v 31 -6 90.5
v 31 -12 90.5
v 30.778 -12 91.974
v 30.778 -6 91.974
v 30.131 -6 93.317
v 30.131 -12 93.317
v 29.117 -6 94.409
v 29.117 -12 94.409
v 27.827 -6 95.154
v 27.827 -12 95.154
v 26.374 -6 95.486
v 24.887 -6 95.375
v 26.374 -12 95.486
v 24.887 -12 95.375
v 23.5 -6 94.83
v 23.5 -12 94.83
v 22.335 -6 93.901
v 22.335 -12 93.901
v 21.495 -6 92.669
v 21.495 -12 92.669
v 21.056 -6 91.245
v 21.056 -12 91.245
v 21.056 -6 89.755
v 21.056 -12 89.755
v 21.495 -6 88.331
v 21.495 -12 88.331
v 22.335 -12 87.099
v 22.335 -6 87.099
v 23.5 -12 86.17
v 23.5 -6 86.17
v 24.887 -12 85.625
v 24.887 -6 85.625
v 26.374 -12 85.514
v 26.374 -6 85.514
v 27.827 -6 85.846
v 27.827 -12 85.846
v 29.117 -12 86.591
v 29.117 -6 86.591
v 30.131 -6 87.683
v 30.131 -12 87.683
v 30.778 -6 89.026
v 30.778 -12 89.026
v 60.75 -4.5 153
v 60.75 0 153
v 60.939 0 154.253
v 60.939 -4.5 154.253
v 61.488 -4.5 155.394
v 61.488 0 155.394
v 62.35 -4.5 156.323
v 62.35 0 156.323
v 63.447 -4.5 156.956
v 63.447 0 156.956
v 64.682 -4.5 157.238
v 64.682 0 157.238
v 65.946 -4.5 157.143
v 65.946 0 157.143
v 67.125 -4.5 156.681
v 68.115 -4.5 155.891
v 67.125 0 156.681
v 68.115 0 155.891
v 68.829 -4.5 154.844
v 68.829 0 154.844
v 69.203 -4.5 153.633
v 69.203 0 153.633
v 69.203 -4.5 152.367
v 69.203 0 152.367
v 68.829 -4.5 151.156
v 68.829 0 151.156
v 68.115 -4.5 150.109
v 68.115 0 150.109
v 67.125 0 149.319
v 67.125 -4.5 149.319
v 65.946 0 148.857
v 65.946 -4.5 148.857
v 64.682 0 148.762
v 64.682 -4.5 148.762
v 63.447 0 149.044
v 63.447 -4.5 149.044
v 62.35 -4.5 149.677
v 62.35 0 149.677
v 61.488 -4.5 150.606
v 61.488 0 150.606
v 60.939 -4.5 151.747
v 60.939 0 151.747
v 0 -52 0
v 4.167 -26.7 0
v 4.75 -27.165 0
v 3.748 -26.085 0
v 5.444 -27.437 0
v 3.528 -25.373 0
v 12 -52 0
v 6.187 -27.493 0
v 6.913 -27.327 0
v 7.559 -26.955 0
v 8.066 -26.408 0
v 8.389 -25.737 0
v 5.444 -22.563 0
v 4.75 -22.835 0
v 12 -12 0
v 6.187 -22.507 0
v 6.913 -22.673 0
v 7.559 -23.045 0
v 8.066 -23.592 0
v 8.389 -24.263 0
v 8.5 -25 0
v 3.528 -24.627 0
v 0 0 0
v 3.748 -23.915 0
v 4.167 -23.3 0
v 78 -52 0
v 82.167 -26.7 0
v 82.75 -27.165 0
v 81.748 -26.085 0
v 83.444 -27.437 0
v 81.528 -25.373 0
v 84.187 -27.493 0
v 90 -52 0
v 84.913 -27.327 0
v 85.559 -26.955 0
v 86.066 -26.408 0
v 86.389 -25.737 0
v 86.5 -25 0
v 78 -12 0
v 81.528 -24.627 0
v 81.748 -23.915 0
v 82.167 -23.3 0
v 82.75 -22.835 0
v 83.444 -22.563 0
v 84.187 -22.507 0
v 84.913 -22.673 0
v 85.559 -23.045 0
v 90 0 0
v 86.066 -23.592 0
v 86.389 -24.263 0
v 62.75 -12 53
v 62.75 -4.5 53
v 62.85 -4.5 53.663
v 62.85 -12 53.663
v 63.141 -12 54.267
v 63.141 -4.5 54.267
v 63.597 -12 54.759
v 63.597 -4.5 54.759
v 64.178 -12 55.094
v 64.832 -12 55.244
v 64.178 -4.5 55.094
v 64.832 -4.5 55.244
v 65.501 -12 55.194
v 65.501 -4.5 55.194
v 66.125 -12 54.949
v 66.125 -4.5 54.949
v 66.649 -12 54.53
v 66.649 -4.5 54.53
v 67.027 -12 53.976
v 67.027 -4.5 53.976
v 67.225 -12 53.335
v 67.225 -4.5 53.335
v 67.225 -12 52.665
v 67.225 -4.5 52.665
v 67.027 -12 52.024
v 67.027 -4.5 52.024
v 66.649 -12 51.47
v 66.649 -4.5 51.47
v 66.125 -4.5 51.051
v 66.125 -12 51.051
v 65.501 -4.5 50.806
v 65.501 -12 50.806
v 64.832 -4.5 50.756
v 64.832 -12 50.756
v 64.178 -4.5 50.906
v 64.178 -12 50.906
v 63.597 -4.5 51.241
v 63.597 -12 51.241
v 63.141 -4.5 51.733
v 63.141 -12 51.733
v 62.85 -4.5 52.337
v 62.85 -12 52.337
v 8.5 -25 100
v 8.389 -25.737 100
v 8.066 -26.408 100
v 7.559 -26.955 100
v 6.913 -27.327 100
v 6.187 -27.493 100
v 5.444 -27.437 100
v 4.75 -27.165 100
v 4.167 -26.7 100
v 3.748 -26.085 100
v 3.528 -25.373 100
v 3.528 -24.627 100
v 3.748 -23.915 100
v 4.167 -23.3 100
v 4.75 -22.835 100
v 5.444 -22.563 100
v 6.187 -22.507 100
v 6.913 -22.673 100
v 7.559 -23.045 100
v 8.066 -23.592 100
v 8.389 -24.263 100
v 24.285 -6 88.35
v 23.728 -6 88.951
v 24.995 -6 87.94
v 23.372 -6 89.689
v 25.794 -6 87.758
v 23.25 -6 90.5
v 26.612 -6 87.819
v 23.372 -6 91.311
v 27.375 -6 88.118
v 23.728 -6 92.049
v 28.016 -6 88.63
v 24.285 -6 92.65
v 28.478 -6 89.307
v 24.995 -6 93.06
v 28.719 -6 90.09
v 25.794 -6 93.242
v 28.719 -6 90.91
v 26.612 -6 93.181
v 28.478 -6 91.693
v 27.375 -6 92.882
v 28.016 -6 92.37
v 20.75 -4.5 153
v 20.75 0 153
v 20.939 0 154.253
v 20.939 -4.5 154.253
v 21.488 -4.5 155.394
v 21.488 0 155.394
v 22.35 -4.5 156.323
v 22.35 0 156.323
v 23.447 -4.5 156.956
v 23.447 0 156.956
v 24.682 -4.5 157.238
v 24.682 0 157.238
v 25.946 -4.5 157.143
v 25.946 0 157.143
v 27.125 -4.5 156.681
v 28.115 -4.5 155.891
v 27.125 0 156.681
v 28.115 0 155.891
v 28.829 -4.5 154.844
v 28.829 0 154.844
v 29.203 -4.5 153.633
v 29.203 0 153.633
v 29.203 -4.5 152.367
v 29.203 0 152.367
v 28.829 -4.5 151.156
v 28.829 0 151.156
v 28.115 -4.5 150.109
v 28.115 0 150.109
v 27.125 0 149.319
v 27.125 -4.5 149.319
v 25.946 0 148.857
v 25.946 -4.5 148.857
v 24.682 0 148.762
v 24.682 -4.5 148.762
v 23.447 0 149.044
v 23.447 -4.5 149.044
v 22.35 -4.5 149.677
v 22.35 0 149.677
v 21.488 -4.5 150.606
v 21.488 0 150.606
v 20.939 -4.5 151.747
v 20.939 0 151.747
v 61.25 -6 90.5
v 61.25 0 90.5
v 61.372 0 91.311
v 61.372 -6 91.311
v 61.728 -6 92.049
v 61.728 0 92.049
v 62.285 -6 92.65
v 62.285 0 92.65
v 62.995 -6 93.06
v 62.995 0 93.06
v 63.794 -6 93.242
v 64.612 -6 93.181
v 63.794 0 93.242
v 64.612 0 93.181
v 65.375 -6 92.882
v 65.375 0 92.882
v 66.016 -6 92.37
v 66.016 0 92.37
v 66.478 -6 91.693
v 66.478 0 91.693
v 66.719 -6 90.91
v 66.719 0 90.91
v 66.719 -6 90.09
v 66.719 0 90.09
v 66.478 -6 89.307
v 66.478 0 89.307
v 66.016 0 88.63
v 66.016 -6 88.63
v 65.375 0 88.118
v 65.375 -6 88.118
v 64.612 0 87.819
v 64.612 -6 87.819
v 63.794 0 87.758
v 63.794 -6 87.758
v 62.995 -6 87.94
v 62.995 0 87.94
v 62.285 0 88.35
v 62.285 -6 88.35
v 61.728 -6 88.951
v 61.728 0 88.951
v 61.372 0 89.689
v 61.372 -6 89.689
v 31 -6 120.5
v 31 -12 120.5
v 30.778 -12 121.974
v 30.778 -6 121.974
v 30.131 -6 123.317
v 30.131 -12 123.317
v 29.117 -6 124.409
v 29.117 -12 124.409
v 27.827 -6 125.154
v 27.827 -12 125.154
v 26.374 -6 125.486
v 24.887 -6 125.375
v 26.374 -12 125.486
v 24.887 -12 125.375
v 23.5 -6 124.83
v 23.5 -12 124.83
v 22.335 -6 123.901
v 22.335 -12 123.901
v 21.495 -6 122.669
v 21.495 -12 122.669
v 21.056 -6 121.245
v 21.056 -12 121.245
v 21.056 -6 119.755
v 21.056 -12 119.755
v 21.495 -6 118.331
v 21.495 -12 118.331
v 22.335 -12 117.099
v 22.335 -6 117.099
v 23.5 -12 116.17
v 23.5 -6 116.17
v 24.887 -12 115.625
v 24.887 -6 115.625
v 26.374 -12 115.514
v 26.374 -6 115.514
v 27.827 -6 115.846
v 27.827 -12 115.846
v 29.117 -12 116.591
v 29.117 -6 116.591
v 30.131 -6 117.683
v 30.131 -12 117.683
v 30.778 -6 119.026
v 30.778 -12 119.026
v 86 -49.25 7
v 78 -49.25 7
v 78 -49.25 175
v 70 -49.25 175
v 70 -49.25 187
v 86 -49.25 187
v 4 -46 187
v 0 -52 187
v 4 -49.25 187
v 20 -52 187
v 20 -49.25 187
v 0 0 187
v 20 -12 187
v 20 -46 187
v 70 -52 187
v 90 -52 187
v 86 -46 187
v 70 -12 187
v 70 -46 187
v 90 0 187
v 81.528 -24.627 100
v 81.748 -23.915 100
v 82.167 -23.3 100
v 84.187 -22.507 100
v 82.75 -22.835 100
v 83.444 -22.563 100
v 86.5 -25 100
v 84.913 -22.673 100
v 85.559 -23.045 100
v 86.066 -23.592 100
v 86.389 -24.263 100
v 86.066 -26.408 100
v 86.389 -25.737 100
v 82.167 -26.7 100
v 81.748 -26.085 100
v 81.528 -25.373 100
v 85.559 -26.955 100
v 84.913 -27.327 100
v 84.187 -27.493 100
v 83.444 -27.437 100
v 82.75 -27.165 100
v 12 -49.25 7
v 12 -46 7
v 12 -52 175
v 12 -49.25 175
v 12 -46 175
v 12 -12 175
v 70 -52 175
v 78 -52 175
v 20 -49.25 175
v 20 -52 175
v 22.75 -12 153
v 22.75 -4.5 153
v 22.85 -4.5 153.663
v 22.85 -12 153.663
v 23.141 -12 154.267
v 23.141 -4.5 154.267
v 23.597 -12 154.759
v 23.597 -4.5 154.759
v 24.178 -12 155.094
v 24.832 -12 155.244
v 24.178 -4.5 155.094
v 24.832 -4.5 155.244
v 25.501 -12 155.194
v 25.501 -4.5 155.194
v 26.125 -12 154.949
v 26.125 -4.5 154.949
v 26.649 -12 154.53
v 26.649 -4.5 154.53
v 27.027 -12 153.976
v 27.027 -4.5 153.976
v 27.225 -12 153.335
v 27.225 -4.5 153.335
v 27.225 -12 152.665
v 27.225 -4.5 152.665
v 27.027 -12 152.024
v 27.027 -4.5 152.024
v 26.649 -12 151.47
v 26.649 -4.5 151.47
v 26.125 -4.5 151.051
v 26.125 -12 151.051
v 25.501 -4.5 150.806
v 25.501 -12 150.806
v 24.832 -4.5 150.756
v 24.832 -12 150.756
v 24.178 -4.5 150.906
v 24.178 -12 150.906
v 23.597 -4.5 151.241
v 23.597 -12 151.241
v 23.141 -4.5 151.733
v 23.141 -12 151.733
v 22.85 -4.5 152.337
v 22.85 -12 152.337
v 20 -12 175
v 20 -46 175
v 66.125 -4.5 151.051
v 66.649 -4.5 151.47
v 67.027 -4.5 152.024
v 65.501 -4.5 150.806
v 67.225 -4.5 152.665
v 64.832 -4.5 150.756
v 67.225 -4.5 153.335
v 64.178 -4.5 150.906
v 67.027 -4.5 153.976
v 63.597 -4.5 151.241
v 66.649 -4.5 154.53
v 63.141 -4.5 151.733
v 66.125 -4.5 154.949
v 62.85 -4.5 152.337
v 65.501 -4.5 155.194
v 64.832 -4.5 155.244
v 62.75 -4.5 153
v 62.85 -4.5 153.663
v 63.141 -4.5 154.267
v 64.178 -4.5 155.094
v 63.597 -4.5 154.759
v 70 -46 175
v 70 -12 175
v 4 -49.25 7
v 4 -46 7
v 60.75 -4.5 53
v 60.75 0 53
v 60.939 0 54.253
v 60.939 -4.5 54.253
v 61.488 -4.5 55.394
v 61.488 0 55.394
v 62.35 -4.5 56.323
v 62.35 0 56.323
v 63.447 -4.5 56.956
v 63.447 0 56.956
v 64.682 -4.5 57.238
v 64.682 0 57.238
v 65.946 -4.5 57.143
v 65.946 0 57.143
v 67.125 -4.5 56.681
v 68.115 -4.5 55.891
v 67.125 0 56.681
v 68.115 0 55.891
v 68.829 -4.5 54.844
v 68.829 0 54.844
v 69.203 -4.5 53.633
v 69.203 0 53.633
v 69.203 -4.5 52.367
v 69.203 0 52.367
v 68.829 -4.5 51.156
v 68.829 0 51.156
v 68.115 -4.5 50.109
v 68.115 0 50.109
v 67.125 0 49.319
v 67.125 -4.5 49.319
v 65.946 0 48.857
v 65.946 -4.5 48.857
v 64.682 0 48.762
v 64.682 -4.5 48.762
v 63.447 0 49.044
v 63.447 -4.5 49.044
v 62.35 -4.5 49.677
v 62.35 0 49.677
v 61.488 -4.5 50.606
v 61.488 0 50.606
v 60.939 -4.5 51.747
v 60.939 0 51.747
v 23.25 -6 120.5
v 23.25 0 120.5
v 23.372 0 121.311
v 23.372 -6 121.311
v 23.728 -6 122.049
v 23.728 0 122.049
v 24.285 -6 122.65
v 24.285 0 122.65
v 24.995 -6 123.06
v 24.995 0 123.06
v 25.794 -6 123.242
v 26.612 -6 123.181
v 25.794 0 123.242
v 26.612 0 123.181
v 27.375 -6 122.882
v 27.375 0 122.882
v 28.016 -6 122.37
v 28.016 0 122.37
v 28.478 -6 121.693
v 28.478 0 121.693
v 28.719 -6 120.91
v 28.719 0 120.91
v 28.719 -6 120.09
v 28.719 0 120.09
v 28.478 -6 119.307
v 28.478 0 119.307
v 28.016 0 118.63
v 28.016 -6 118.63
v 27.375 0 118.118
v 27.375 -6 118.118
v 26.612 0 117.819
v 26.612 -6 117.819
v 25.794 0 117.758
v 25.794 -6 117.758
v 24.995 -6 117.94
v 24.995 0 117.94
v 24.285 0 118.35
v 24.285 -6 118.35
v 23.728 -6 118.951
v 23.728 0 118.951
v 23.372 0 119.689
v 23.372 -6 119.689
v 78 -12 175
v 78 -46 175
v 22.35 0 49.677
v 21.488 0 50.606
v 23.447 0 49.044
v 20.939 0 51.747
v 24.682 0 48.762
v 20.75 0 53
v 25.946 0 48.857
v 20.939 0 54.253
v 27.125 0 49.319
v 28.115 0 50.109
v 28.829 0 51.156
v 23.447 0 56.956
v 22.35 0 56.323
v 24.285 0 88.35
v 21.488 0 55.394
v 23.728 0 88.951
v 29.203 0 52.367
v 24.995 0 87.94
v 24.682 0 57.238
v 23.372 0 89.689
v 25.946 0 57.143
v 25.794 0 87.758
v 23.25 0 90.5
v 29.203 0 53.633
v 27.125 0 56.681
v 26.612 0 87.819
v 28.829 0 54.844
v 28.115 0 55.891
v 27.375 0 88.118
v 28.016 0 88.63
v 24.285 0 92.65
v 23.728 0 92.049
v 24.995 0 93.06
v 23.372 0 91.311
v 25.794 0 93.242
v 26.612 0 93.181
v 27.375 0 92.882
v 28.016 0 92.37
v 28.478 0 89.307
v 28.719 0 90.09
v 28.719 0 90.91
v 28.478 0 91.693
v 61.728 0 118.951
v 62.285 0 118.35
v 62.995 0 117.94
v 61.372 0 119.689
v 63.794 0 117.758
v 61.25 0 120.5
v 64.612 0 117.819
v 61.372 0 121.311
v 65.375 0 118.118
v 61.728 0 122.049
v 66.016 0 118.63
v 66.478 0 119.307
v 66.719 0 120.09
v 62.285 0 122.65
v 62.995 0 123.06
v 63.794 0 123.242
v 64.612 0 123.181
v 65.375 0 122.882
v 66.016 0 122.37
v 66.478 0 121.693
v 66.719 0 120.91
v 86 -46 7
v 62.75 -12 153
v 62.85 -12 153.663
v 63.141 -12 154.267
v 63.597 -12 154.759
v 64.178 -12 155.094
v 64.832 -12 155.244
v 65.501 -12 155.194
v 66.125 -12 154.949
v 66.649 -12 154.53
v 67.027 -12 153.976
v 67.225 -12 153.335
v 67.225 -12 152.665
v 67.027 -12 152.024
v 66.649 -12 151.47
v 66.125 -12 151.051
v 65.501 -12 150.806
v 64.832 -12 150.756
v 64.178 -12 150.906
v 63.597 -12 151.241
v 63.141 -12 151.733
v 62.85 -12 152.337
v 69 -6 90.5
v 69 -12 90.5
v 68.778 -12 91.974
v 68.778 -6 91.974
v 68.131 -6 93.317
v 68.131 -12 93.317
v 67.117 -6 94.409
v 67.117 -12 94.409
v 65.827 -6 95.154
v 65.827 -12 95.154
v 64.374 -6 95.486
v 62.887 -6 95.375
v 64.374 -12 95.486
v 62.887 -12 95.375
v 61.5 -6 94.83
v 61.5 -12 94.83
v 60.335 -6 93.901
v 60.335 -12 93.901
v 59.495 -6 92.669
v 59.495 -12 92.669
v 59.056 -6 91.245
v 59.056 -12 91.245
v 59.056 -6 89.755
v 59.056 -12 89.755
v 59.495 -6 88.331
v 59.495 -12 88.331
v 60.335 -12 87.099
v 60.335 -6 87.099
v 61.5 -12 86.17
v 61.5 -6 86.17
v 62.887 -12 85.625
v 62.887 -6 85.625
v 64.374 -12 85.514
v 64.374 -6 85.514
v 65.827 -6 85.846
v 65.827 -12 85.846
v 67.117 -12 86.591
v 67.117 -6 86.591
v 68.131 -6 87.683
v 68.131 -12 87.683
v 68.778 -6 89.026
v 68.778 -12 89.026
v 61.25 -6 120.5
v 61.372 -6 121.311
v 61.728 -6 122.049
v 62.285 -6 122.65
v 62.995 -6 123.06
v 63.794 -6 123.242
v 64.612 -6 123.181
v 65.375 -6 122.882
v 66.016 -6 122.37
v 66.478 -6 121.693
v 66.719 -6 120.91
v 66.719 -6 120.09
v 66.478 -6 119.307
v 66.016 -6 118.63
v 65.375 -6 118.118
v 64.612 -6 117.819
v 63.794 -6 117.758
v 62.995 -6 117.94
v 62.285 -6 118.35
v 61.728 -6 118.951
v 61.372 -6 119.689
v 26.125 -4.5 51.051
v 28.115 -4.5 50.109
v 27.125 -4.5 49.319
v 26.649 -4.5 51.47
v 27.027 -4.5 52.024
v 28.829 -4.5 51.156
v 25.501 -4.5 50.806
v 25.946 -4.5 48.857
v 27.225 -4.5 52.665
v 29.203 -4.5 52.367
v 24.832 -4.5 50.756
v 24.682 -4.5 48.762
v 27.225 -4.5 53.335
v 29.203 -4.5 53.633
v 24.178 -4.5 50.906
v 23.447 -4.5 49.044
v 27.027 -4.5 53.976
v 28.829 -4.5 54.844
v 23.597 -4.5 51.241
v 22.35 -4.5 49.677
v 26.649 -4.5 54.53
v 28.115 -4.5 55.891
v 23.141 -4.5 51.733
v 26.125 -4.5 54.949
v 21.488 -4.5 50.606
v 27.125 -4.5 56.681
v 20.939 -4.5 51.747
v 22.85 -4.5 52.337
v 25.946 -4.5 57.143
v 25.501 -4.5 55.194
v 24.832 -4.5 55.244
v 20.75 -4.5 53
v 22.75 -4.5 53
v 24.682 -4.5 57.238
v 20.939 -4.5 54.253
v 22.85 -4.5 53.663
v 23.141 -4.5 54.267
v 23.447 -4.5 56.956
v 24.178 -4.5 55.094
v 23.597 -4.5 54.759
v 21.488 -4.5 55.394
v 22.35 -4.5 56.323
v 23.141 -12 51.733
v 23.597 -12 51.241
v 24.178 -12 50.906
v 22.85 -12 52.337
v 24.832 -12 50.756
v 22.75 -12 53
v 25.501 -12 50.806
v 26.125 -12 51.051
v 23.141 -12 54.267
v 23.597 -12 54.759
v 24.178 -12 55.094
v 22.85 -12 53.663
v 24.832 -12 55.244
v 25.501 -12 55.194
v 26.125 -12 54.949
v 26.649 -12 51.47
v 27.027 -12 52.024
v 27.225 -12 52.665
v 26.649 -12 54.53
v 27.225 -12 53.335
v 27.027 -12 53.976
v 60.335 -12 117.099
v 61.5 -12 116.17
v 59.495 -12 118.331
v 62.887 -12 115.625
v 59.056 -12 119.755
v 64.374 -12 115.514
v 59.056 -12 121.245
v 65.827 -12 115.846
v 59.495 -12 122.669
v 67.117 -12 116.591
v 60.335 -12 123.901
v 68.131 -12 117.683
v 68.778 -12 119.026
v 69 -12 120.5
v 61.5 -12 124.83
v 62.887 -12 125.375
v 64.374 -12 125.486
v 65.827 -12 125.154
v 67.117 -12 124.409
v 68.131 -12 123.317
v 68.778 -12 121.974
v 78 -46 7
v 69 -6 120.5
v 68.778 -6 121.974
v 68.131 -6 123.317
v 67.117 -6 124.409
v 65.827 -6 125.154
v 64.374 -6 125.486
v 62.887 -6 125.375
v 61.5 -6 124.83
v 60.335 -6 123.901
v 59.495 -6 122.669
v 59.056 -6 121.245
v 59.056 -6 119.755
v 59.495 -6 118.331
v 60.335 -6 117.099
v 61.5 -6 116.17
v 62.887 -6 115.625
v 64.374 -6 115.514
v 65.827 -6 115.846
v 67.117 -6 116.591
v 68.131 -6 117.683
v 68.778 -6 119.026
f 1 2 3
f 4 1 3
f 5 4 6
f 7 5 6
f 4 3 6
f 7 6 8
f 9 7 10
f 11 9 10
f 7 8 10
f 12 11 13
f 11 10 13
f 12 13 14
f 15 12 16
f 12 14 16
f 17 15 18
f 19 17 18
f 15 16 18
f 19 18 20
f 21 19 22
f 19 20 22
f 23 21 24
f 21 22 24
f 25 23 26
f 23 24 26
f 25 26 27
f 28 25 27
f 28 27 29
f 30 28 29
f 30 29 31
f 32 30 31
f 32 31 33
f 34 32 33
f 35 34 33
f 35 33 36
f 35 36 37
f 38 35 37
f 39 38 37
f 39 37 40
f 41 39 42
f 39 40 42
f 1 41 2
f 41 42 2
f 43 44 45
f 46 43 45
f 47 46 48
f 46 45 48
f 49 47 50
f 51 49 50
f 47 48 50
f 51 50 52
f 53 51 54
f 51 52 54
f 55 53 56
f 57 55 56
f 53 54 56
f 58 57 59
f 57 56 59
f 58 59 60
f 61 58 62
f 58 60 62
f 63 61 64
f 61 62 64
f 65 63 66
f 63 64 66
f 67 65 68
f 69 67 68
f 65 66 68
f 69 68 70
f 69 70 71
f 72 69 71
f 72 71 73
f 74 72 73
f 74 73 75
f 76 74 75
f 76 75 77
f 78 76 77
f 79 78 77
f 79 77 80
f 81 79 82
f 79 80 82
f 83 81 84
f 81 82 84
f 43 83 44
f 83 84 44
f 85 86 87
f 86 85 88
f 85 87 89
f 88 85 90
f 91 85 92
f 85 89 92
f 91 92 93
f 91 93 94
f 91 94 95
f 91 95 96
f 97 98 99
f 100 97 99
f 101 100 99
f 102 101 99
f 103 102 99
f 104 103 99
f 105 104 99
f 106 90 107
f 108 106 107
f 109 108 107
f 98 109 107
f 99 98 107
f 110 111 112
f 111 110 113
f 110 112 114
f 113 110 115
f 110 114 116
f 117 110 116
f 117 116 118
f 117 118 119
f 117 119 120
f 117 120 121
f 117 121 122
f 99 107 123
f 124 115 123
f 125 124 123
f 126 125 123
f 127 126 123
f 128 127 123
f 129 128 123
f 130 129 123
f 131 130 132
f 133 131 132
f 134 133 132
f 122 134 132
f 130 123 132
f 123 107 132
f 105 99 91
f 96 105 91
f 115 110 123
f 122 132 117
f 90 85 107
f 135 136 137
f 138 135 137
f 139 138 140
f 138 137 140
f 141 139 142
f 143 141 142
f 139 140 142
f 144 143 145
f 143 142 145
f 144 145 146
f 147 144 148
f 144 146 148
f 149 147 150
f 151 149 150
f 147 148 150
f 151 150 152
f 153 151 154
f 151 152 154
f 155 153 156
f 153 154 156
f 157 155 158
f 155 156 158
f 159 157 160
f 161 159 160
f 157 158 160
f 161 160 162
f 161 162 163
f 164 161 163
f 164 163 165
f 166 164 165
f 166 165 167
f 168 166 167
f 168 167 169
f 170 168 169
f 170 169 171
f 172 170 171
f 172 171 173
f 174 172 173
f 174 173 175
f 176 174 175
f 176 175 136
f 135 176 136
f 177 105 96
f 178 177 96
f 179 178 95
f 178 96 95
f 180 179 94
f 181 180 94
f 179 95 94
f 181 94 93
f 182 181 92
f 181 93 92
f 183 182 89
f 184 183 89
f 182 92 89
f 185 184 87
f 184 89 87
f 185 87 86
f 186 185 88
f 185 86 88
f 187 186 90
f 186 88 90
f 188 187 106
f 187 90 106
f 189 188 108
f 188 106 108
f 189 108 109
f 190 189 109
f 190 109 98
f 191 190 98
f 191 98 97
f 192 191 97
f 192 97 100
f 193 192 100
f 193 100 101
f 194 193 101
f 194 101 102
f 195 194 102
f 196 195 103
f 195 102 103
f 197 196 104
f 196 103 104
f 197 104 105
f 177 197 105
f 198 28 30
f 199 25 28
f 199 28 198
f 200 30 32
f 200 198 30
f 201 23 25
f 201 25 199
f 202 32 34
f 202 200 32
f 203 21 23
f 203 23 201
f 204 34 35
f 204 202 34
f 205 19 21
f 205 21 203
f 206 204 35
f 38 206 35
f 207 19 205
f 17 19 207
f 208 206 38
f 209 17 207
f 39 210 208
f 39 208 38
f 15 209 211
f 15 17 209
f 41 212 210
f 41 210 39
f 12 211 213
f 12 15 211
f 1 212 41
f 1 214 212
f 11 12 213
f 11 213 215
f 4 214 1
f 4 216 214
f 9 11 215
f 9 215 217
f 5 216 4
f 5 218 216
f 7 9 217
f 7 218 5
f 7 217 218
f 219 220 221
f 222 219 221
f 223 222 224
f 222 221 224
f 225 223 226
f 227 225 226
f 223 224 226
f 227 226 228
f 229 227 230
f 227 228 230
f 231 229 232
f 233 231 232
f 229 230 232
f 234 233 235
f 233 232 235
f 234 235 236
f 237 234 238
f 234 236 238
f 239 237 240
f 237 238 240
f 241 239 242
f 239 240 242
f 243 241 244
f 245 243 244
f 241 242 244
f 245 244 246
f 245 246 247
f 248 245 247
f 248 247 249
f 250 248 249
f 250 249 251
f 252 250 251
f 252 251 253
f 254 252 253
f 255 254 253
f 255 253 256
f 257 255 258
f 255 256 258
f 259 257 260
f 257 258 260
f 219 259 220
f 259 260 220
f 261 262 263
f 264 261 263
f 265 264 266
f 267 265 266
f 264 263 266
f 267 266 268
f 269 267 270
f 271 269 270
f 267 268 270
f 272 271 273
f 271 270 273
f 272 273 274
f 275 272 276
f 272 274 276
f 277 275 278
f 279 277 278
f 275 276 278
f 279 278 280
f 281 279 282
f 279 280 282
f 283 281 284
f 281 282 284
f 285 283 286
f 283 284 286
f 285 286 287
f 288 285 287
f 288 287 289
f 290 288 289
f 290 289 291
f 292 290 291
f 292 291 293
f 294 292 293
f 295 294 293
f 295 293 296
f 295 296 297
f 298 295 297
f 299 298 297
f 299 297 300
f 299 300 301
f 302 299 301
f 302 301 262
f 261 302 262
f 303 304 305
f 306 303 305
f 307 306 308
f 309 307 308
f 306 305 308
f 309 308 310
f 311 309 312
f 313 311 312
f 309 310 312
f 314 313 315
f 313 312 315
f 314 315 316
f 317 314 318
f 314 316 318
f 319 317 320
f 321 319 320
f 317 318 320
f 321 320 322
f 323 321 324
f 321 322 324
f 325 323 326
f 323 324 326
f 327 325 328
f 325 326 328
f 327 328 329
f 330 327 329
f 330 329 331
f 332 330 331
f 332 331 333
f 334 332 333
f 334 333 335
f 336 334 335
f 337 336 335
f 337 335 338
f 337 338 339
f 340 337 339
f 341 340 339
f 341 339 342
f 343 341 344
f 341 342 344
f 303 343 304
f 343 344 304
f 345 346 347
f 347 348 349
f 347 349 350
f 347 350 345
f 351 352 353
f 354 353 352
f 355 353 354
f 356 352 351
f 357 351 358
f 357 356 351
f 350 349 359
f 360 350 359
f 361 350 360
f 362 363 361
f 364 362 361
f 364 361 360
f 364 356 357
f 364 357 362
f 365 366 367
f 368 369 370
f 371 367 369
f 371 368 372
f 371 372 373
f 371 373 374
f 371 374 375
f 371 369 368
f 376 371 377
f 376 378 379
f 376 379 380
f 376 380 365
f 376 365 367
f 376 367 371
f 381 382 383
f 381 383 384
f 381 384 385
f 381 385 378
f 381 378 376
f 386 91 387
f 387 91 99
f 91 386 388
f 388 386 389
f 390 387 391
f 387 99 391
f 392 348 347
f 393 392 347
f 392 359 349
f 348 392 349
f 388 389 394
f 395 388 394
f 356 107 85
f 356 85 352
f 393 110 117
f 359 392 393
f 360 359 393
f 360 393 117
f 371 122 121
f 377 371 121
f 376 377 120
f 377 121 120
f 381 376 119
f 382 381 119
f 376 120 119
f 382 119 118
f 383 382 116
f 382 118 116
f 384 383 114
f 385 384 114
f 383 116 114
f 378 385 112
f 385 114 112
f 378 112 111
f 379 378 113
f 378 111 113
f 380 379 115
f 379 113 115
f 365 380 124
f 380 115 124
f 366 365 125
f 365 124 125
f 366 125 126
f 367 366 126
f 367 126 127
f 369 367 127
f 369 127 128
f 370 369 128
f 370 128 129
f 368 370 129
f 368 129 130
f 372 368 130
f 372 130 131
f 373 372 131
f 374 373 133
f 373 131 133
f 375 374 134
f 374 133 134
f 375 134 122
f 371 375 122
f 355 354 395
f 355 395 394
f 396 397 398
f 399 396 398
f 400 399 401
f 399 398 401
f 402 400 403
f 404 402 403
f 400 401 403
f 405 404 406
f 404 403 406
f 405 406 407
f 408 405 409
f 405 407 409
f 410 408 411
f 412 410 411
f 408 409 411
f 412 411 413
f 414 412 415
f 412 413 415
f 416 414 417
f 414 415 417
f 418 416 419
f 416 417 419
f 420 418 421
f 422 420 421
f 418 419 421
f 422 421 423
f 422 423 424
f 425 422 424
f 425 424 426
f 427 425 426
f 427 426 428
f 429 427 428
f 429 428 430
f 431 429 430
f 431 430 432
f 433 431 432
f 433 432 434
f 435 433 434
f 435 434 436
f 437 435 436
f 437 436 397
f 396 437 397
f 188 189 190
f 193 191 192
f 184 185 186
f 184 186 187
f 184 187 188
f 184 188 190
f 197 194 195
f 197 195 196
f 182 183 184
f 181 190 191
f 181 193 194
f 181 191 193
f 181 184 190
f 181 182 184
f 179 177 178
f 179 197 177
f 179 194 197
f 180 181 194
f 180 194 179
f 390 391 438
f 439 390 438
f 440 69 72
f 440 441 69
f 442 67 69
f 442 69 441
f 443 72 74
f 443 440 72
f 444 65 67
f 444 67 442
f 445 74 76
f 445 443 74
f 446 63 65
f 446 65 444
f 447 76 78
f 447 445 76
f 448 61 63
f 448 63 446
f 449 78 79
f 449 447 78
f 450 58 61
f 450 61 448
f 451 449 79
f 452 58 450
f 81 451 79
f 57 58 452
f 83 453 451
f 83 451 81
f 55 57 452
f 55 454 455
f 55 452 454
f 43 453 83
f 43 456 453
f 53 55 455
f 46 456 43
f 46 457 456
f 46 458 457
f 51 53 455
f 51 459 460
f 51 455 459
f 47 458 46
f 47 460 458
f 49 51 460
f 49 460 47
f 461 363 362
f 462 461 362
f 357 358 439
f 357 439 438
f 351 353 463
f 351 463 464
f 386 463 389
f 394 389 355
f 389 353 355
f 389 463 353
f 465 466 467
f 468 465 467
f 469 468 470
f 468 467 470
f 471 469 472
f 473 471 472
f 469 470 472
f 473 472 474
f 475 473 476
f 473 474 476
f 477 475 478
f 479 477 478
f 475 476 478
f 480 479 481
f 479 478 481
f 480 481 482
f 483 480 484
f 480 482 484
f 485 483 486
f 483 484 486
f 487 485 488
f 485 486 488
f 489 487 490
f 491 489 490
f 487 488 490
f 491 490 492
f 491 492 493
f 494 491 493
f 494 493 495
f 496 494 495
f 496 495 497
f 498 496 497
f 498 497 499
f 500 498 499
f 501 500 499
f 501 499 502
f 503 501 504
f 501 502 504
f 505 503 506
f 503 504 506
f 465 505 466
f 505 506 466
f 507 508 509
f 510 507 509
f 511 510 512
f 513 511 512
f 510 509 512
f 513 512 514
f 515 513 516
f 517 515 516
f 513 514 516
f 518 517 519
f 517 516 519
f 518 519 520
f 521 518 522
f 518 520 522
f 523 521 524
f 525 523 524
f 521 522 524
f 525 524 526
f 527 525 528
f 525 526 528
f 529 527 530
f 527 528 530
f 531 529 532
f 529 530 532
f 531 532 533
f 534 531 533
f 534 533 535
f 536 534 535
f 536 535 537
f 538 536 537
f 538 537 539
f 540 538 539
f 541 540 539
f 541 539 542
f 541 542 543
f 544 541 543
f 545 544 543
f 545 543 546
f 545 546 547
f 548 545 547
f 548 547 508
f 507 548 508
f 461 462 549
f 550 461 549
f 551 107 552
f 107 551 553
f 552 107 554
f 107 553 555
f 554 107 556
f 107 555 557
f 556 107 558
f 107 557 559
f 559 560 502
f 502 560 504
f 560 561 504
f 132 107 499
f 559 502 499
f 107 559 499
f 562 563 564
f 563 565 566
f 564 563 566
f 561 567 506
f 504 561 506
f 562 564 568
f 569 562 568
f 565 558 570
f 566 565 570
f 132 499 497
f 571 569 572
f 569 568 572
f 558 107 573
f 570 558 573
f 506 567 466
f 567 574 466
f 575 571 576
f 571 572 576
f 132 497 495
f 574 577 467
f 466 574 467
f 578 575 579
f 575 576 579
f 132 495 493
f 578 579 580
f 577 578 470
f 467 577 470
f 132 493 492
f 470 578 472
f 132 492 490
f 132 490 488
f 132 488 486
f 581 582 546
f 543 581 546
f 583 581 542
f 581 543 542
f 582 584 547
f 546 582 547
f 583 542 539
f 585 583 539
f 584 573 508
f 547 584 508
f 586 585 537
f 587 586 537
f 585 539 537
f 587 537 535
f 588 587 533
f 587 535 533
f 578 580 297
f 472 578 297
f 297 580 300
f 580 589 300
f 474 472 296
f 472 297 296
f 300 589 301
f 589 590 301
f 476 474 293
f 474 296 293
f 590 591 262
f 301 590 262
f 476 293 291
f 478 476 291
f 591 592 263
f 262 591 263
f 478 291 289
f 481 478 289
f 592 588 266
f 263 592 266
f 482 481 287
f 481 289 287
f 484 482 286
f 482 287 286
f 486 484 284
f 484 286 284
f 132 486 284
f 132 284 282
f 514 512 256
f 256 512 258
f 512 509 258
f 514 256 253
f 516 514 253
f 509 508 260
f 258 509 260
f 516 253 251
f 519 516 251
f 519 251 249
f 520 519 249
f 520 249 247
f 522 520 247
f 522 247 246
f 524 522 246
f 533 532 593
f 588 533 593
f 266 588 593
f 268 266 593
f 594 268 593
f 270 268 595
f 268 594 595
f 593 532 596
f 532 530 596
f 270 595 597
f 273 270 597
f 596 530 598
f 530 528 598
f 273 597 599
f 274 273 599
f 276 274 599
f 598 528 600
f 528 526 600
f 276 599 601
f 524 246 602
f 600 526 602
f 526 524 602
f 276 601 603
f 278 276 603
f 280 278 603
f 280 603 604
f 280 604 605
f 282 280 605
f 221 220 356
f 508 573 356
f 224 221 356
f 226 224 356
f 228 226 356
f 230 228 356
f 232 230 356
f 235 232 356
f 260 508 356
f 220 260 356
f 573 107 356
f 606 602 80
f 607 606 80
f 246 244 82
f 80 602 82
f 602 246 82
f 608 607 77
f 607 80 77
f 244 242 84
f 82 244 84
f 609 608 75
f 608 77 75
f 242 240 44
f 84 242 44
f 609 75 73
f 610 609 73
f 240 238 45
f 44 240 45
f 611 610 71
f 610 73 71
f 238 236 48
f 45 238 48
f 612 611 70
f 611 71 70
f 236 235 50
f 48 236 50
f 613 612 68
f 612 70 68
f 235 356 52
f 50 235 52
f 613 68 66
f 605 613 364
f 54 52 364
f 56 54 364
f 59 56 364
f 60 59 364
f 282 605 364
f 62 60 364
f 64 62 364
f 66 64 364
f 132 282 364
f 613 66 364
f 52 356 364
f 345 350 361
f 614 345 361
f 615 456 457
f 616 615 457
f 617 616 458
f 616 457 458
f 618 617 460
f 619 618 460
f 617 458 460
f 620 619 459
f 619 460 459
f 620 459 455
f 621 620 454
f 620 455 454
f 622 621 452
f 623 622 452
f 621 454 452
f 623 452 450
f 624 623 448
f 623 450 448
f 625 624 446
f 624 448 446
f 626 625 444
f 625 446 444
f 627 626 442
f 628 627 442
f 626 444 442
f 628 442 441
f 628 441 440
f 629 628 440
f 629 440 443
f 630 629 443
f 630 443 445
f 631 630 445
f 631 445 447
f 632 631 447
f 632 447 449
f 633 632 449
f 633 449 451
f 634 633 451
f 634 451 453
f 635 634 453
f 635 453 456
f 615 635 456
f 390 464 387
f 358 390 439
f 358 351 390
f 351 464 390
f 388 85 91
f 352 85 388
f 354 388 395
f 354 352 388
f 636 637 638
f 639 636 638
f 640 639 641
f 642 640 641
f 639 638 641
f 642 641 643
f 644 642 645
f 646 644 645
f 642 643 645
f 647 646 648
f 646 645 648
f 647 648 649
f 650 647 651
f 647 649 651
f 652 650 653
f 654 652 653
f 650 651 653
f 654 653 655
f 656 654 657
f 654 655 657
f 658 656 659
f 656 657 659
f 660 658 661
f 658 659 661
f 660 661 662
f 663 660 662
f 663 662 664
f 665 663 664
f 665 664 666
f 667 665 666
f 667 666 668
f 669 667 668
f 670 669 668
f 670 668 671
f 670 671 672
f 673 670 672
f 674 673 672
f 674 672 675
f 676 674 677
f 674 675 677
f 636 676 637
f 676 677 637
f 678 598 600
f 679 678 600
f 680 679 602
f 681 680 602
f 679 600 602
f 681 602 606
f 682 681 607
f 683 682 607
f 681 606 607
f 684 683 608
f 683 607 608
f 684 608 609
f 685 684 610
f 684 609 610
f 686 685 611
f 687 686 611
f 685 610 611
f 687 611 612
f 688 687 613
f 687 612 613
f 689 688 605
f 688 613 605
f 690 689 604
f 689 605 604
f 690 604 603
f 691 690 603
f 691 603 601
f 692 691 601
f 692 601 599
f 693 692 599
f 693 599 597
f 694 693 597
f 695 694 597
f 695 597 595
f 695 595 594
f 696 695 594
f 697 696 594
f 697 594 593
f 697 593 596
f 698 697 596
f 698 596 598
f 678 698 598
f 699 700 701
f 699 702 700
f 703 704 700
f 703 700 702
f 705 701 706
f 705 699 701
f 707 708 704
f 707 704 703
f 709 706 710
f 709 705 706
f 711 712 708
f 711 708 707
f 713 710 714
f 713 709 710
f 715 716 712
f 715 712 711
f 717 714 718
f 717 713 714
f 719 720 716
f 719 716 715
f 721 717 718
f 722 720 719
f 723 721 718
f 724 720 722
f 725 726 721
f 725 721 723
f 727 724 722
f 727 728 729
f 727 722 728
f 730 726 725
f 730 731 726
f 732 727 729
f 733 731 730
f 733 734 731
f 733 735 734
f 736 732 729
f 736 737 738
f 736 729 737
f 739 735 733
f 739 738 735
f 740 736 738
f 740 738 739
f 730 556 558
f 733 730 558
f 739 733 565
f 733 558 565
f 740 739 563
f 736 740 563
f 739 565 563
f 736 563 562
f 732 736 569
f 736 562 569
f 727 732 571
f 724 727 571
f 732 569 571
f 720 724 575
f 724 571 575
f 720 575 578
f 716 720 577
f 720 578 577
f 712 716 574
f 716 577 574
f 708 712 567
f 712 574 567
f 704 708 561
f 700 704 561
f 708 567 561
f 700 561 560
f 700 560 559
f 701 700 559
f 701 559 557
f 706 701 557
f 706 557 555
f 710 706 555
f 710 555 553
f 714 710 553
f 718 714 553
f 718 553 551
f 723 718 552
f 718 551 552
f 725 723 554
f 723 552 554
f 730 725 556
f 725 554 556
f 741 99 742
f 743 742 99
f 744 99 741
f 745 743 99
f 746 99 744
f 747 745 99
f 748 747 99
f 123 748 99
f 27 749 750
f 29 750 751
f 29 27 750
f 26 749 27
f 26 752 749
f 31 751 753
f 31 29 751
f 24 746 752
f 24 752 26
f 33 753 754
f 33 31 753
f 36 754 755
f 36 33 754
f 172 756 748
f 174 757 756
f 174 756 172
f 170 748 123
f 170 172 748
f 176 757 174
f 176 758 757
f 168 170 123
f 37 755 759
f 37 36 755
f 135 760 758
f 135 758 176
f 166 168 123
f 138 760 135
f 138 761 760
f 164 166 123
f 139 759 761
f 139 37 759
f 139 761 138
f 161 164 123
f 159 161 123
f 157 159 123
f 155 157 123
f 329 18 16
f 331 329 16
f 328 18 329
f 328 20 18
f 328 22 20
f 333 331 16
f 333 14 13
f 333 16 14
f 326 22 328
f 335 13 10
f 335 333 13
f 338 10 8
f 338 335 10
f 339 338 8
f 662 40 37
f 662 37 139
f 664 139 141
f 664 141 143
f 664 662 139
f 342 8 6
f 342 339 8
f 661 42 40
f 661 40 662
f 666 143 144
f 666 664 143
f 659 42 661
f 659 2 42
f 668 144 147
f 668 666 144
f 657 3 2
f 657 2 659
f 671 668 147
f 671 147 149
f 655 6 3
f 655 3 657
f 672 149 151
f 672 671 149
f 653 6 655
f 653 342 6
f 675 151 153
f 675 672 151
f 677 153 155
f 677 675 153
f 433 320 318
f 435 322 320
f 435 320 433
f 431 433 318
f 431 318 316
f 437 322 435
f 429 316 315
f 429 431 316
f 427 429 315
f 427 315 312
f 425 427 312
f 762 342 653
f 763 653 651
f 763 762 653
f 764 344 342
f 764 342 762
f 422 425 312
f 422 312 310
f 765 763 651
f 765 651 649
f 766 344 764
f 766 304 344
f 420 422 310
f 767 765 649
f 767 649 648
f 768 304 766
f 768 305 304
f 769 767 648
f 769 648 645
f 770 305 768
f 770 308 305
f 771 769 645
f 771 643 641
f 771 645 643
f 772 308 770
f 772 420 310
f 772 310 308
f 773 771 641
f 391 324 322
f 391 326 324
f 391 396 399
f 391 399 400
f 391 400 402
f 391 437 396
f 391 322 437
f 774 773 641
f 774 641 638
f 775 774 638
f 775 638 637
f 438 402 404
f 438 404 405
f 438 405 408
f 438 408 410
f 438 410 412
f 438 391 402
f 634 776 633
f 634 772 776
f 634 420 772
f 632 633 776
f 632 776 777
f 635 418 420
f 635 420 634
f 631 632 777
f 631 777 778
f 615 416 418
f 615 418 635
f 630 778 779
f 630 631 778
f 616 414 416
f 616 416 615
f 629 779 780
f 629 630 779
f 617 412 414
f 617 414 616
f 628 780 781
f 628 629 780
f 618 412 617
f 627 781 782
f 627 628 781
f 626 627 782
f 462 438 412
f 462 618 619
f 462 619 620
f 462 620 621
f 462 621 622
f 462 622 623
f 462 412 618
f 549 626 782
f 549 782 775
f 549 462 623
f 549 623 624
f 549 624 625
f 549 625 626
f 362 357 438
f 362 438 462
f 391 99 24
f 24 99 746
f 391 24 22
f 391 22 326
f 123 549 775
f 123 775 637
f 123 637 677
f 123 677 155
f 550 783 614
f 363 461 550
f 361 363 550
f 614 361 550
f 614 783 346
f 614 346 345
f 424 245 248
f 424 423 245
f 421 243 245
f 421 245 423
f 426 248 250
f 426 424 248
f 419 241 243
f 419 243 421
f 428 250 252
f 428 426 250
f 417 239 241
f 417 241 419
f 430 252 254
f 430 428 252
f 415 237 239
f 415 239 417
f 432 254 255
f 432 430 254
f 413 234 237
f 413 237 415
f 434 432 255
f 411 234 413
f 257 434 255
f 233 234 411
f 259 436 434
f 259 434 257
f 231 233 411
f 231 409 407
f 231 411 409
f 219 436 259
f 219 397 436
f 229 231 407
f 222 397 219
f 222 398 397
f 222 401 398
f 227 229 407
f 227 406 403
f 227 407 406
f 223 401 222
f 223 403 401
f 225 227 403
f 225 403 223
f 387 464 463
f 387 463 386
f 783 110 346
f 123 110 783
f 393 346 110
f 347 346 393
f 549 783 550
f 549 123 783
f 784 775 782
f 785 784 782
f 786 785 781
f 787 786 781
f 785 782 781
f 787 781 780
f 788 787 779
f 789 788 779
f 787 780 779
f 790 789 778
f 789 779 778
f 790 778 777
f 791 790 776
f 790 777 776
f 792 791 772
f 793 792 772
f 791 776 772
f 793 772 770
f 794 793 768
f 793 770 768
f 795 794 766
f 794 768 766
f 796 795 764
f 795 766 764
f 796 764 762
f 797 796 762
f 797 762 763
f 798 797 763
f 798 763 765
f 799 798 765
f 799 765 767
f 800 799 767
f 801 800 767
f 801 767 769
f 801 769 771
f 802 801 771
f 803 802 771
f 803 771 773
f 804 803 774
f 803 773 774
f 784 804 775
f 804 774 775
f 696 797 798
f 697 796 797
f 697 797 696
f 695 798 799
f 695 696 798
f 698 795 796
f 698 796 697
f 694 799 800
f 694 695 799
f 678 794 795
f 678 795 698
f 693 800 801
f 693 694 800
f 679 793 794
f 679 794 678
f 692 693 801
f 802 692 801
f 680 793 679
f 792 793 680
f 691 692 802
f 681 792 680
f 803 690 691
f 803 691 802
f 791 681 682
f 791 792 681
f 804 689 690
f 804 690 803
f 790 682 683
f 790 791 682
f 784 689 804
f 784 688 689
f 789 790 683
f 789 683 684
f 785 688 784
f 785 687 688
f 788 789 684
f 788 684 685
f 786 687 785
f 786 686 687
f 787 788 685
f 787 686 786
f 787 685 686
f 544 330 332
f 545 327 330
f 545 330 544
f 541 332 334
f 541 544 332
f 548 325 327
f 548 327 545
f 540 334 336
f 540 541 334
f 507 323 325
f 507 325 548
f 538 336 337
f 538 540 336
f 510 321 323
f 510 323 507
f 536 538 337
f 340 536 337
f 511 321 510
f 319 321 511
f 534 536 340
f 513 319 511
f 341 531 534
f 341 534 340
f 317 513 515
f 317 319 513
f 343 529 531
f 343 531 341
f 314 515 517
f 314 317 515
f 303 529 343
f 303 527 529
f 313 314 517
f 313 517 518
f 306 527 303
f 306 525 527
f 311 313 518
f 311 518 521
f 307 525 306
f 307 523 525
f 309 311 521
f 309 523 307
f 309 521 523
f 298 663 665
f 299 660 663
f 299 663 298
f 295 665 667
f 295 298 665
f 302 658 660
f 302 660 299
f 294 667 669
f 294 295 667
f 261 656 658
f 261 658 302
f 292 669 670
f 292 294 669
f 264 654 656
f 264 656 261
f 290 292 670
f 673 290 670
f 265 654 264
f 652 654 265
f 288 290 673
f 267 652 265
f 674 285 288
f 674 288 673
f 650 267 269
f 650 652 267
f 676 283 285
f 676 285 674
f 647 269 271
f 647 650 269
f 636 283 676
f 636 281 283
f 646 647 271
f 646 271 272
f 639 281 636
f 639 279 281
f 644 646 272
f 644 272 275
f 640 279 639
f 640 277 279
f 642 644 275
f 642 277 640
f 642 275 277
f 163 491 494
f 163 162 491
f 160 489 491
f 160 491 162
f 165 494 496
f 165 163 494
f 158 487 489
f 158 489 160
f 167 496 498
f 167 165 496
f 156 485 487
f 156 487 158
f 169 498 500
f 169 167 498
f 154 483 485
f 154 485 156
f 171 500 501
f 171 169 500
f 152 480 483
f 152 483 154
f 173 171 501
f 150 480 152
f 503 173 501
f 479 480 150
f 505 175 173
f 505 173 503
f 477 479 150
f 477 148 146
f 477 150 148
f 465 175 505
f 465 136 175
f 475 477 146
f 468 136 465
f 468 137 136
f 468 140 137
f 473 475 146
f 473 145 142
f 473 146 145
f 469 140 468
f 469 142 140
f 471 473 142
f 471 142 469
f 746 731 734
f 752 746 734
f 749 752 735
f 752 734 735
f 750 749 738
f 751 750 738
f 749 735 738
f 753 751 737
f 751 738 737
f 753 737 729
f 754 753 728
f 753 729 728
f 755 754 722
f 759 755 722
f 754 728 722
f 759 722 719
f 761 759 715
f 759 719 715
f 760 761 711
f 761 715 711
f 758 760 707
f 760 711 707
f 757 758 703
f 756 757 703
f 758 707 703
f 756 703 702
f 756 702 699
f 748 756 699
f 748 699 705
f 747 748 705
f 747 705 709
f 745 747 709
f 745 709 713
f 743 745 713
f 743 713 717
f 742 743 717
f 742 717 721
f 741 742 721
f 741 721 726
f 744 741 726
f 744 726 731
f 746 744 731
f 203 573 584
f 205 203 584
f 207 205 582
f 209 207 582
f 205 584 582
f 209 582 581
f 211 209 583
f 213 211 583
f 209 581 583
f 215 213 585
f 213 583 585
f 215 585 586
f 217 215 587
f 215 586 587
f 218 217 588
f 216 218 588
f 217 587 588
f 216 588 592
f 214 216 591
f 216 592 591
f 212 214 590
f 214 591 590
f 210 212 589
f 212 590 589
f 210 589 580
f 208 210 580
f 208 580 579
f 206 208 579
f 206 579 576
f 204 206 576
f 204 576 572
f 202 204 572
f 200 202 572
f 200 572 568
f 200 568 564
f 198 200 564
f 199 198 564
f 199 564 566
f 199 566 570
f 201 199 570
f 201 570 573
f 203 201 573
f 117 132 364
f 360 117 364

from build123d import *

# Parameters (mm, degrees)
F0_W      = 90
F0_H      = 187
F1_DEPTH  = 52
F2_T      = -12
F3_W      = 50
F3_H      = 40
F4_DEPTH  = 25
F5_R      = 2.25
F5_R_2    = 2.75
F6_DEPTH  = 52.001
F7_R      = 5
F8_DEPTH  = 6
F9_R      = 4.25
F10_DEPTH = 4.5
F11_R     = 2.5
F12_DEPTH = 100
F13_W     = 82
F13_H     = 3.25
F14_DEPTH = 180


with BuildPart() as f1:
    # F0 (on Front) → F1 (new body)
    with BuildSketch(Plane.XZ):
        with Locations((45, 93.5)):
            Rectangle(F0_W, F0_H)
    extrude(amount=F1_DEPTH)

    # F2
    f2_openings = [f1.faces().sort_by_distance(p)[0] for p in [
        (45, -52, 93.5),
        (45, -26, 0),
    ]]
    offset(amount=F2_T, openings=f2_openings)

    # F3 (on face) → F4 (cut)
    with BuildSketch(Plane.XY.offset(187)):
        with Locations((45, -32)):
            Rectangle(F3_W, F3_H)
    extrude(amount=-F4_DEPTH, mode=Mode.SUBTRACT)

    # F5 (on face) → F6 (cut, through all)
    with BuildSketch(Plane(origin=(0, 0, 0), x_dir=(-1, 0, 0), z_dir=(0, 1, 0))):
        with Locations((-65, 53)):
            Circle(F5_R)
        with Locations((-25, 53)):
            Circle(F5_R)
        with Locations((-65, 153)):
            Circle(F5_R)
        with Locations((-25, 153)):
            Circle(F5_R)
        with Locations((-26, 120.5)):
            Circle(F5_R_2)
        with Locations((-64, 120.5)):
            Circle(F5_R_2)
        with Locations((-26, 90.5)):
            Circle(F5_R_2)
        with Locations((-64, 90.5)):
            Circle(F5_R_2)
    extrude(amount=-F6_DEPTH, mode=Mode.SUBTRACT)

    # F7 (on face) → F8 (cut)
    with BuildSketch(Plane.XZ.offset(12)):
        with Locations((26, 120.5)):
            Circle(F7_R)
        with Locations((64, 120.5)):
            Circle(F7_R)
        with Locations((26, 90.5)):
            Circle(F7_R)
        with Locations((64, 90.5)):
            Circle(F7_R)
    extrude(amount=-F8_DEPTH, mode=Mode.SUBTRACT)

    # F9 (on face) → F10 (cut)
    with BuildSketch(Plane(origin=(0, 0, 0), x_dir=(-1, 0, 0), z_dir=(0, 1, 0))):
        with Locations((-65, 153)):
            Circle(F9_R)
        with Locations((-25, 153)):
            Circle(F9_R)
        with Locations((-65, 53)):
            Circle(F9_R)
        with Locations((-25, 53)):
            Circle(F9_R)
    extrude(amount=-F10_DEPTH, mode=Mode.SUBTRACT)

    # F11 (on face) → F12 (cut)
    with BuildSketch(Plane(origin=(0, 0, 0), x_dir=(1, 0, 0), z_dir=(0, 0, -1))):
        with Locations((6, 25)):
            Circle(F11_R)
        with Locations((84, 25)):
            Circle(F11_R)
    extrude(amount=-F12_DEPTH, mode=Mode.SUBTRACT)

    # F13 (on face) → F14 (cut)
    with BuildSketch(Plane.XY.offset(187)):
        with Locations((45, -47.625)):
            Rectangle(F13_W, F13_H)
    extrude(amount=-F14_DEPTH, mode=Mode.SUBTRACT)


solid = f1.part
